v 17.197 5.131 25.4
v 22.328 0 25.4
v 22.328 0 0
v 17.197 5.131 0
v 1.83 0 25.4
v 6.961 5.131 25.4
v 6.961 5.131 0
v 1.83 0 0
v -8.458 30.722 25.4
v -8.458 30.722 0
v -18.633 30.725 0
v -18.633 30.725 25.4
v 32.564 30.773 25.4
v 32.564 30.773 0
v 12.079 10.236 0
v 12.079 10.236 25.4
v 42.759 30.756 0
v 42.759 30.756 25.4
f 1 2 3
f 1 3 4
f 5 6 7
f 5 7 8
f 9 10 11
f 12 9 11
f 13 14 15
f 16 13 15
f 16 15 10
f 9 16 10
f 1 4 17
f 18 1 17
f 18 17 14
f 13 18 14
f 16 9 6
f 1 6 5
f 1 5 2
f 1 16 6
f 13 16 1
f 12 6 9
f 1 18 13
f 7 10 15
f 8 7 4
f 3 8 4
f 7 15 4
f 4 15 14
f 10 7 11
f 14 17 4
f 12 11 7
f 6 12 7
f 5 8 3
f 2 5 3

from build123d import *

# Parameters (mm, degrees)
F0_W     = 5.1181
F0_H     = 5.1308
F1_DEPTH = 25.4


with BuildPart() as f1:
    # F0 (on Top) → F1 (new body)
    with BuildSketch(Plane.XY):
        Polygon((-18.632969, 30.72453), (6.960761, 5.1308), (12.078861, 10.2362), (-8.457507, 30.72161), align=None)
        Polygon((32.564271, 30.772569), (12.078861, 10.2362), (17.196961, 5.1308), (42.758878, 30.756304), align=None)
        Polygon((12.078861, 10.2362), (12.078861, 5.1308), (17.196961, 5.1308), align=None)
        Polygon((12.078861, 10.2362), (6.960761, 5.1308), (12.078861, 5.1308), align=None)
        Polygon((6.960761, 5.1308), (1.829961, 0), (6.960761, 0), align=None)
        with Locations((9.519811, 2.5654)):
            Rectangle(F0_W, F0_H)
        with Locations((14.637911, 2.5654)):
            Rectangle(F0_W, F0_H)
        Polygon((17.196961, 5.1308), (17.196961, 0), (22.327761, 0), align=None)
    extrude(amount=F1_DEPTH)


solid = f1.part
